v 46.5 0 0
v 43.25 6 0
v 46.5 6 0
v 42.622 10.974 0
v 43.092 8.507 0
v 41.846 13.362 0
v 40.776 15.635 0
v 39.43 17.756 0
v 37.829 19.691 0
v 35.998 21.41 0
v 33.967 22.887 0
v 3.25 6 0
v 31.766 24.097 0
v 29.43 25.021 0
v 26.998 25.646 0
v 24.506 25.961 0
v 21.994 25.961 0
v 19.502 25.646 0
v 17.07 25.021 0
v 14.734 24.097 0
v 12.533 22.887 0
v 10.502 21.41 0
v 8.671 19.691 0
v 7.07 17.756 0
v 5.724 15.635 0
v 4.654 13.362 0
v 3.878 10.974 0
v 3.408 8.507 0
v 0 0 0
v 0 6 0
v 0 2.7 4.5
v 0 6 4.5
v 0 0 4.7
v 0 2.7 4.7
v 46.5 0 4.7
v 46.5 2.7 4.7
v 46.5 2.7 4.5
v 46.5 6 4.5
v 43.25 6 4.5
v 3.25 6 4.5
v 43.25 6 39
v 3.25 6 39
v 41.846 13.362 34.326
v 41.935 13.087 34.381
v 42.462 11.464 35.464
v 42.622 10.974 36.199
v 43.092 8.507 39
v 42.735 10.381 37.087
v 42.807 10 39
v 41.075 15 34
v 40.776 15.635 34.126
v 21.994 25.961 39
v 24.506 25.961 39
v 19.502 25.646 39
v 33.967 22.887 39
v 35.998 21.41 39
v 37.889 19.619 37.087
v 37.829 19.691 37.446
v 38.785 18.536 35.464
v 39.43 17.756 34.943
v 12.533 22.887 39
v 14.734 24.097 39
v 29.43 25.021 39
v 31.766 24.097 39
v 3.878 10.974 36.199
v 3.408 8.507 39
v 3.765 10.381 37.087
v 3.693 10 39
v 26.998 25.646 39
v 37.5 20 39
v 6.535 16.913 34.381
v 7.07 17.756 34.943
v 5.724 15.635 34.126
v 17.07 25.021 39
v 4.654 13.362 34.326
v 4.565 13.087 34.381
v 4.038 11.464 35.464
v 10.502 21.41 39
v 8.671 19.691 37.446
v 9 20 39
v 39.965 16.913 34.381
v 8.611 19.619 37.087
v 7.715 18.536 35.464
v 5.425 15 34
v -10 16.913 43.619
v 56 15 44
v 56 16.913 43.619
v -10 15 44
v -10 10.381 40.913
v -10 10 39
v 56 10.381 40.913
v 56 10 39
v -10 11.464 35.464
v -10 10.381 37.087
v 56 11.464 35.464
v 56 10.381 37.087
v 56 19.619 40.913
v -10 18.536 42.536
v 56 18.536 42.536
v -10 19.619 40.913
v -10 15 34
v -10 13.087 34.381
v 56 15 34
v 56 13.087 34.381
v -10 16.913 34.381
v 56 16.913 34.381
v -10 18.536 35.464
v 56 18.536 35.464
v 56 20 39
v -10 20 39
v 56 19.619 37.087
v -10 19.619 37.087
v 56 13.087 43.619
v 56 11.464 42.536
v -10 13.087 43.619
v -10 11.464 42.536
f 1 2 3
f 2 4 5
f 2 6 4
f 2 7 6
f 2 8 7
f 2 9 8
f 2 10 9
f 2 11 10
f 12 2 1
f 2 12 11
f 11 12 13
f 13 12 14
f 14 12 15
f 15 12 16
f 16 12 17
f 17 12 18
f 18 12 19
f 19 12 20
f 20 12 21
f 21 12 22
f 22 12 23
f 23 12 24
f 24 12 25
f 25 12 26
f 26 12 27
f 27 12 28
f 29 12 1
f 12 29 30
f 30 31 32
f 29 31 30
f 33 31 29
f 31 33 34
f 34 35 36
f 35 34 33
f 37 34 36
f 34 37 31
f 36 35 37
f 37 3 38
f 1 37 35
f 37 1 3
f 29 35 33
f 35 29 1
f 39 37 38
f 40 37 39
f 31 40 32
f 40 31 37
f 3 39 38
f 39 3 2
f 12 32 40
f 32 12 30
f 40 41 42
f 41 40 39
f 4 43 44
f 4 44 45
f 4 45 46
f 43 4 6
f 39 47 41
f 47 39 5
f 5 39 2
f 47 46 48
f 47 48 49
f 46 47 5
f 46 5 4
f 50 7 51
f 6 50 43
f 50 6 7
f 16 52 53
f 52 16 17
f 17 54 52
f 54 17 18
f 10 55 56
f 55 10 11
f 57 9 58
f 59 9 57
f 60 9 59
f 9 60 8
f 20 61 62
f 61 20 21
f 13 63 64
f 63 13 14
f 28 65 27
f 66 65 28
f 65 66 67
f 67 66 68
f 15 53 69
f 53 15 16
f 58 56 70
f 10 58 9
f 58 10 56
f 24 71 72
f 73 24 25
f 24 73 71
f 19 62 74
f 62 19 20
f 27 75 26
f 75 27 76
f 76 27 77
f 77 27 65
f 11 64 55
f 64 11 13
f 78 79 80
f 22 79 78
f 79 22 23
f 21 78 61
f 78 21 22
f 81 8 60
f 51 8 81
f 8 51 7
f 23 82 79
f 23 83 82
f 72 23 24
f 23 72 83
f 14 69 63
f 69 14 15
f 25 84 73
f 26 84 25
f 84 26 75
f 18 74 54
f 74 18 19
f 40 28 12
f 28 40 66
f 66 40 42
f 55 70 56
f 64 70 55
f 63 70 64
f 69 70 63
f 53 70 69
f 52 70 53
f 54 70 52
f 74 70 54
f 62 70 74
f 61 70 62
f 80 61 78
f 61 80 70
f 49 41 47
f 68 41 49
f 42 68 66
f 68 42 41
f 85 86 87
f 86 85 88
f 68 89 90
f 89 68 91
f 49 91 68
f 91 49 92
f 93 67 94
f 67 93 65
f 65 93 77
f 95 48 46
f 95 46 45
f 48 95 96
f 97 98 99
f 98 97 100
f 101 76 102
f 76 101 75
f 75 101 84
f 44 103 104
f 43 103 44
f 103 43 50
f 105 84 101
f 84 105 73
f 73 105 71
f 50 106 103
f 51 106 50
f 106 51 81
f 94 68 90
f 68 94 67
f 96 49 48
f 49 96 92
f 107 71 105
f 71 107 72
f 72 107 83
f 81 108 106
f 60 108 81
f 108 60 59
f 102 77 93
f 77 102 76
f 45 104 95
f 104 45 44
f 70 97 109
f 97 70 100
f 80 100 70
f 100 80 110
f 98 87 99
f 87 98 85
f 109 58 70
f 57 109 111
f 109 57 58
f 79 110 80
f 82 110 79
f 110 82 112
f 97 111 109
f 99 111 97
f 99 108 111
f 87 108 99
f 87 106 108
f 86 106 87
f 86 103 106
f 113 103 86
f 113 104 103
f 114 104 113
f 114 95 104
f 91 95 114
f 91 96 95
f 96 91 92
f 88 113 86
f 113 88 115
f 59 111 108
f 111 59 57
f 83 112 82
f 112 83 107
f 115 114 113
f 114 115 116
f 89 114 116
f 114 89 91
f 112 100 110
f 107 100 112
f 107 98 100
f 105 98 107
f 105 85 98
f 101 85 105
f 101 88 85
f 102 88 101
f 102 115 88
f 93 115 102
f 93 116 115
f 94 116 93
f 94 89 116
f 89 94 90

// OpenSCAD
union(){
        // 長い方の溝
        color([0,0.8,0])
            linear_extrude(4.7){
                square([46.5,2.7]);
            }
        // 短い方の溝
        color([0,0.8,0.8])
            linear_extrude(4.5){
                square([46.5,6]);
            }
            // 半円
            linear_extrude(39){
                translate([23.25,6,0]){
                    difference(){
                        circle(20,$fn=50);
                        translate([-23.25,-23.25,0]) square([46.5,23.25]);
                    }
                }
            }
        color([0.8,0,0])
        translate([-10,15,39]){
            rotate([0,90,0]){
                cylinder(66,5,5);
            }
        }        
}
